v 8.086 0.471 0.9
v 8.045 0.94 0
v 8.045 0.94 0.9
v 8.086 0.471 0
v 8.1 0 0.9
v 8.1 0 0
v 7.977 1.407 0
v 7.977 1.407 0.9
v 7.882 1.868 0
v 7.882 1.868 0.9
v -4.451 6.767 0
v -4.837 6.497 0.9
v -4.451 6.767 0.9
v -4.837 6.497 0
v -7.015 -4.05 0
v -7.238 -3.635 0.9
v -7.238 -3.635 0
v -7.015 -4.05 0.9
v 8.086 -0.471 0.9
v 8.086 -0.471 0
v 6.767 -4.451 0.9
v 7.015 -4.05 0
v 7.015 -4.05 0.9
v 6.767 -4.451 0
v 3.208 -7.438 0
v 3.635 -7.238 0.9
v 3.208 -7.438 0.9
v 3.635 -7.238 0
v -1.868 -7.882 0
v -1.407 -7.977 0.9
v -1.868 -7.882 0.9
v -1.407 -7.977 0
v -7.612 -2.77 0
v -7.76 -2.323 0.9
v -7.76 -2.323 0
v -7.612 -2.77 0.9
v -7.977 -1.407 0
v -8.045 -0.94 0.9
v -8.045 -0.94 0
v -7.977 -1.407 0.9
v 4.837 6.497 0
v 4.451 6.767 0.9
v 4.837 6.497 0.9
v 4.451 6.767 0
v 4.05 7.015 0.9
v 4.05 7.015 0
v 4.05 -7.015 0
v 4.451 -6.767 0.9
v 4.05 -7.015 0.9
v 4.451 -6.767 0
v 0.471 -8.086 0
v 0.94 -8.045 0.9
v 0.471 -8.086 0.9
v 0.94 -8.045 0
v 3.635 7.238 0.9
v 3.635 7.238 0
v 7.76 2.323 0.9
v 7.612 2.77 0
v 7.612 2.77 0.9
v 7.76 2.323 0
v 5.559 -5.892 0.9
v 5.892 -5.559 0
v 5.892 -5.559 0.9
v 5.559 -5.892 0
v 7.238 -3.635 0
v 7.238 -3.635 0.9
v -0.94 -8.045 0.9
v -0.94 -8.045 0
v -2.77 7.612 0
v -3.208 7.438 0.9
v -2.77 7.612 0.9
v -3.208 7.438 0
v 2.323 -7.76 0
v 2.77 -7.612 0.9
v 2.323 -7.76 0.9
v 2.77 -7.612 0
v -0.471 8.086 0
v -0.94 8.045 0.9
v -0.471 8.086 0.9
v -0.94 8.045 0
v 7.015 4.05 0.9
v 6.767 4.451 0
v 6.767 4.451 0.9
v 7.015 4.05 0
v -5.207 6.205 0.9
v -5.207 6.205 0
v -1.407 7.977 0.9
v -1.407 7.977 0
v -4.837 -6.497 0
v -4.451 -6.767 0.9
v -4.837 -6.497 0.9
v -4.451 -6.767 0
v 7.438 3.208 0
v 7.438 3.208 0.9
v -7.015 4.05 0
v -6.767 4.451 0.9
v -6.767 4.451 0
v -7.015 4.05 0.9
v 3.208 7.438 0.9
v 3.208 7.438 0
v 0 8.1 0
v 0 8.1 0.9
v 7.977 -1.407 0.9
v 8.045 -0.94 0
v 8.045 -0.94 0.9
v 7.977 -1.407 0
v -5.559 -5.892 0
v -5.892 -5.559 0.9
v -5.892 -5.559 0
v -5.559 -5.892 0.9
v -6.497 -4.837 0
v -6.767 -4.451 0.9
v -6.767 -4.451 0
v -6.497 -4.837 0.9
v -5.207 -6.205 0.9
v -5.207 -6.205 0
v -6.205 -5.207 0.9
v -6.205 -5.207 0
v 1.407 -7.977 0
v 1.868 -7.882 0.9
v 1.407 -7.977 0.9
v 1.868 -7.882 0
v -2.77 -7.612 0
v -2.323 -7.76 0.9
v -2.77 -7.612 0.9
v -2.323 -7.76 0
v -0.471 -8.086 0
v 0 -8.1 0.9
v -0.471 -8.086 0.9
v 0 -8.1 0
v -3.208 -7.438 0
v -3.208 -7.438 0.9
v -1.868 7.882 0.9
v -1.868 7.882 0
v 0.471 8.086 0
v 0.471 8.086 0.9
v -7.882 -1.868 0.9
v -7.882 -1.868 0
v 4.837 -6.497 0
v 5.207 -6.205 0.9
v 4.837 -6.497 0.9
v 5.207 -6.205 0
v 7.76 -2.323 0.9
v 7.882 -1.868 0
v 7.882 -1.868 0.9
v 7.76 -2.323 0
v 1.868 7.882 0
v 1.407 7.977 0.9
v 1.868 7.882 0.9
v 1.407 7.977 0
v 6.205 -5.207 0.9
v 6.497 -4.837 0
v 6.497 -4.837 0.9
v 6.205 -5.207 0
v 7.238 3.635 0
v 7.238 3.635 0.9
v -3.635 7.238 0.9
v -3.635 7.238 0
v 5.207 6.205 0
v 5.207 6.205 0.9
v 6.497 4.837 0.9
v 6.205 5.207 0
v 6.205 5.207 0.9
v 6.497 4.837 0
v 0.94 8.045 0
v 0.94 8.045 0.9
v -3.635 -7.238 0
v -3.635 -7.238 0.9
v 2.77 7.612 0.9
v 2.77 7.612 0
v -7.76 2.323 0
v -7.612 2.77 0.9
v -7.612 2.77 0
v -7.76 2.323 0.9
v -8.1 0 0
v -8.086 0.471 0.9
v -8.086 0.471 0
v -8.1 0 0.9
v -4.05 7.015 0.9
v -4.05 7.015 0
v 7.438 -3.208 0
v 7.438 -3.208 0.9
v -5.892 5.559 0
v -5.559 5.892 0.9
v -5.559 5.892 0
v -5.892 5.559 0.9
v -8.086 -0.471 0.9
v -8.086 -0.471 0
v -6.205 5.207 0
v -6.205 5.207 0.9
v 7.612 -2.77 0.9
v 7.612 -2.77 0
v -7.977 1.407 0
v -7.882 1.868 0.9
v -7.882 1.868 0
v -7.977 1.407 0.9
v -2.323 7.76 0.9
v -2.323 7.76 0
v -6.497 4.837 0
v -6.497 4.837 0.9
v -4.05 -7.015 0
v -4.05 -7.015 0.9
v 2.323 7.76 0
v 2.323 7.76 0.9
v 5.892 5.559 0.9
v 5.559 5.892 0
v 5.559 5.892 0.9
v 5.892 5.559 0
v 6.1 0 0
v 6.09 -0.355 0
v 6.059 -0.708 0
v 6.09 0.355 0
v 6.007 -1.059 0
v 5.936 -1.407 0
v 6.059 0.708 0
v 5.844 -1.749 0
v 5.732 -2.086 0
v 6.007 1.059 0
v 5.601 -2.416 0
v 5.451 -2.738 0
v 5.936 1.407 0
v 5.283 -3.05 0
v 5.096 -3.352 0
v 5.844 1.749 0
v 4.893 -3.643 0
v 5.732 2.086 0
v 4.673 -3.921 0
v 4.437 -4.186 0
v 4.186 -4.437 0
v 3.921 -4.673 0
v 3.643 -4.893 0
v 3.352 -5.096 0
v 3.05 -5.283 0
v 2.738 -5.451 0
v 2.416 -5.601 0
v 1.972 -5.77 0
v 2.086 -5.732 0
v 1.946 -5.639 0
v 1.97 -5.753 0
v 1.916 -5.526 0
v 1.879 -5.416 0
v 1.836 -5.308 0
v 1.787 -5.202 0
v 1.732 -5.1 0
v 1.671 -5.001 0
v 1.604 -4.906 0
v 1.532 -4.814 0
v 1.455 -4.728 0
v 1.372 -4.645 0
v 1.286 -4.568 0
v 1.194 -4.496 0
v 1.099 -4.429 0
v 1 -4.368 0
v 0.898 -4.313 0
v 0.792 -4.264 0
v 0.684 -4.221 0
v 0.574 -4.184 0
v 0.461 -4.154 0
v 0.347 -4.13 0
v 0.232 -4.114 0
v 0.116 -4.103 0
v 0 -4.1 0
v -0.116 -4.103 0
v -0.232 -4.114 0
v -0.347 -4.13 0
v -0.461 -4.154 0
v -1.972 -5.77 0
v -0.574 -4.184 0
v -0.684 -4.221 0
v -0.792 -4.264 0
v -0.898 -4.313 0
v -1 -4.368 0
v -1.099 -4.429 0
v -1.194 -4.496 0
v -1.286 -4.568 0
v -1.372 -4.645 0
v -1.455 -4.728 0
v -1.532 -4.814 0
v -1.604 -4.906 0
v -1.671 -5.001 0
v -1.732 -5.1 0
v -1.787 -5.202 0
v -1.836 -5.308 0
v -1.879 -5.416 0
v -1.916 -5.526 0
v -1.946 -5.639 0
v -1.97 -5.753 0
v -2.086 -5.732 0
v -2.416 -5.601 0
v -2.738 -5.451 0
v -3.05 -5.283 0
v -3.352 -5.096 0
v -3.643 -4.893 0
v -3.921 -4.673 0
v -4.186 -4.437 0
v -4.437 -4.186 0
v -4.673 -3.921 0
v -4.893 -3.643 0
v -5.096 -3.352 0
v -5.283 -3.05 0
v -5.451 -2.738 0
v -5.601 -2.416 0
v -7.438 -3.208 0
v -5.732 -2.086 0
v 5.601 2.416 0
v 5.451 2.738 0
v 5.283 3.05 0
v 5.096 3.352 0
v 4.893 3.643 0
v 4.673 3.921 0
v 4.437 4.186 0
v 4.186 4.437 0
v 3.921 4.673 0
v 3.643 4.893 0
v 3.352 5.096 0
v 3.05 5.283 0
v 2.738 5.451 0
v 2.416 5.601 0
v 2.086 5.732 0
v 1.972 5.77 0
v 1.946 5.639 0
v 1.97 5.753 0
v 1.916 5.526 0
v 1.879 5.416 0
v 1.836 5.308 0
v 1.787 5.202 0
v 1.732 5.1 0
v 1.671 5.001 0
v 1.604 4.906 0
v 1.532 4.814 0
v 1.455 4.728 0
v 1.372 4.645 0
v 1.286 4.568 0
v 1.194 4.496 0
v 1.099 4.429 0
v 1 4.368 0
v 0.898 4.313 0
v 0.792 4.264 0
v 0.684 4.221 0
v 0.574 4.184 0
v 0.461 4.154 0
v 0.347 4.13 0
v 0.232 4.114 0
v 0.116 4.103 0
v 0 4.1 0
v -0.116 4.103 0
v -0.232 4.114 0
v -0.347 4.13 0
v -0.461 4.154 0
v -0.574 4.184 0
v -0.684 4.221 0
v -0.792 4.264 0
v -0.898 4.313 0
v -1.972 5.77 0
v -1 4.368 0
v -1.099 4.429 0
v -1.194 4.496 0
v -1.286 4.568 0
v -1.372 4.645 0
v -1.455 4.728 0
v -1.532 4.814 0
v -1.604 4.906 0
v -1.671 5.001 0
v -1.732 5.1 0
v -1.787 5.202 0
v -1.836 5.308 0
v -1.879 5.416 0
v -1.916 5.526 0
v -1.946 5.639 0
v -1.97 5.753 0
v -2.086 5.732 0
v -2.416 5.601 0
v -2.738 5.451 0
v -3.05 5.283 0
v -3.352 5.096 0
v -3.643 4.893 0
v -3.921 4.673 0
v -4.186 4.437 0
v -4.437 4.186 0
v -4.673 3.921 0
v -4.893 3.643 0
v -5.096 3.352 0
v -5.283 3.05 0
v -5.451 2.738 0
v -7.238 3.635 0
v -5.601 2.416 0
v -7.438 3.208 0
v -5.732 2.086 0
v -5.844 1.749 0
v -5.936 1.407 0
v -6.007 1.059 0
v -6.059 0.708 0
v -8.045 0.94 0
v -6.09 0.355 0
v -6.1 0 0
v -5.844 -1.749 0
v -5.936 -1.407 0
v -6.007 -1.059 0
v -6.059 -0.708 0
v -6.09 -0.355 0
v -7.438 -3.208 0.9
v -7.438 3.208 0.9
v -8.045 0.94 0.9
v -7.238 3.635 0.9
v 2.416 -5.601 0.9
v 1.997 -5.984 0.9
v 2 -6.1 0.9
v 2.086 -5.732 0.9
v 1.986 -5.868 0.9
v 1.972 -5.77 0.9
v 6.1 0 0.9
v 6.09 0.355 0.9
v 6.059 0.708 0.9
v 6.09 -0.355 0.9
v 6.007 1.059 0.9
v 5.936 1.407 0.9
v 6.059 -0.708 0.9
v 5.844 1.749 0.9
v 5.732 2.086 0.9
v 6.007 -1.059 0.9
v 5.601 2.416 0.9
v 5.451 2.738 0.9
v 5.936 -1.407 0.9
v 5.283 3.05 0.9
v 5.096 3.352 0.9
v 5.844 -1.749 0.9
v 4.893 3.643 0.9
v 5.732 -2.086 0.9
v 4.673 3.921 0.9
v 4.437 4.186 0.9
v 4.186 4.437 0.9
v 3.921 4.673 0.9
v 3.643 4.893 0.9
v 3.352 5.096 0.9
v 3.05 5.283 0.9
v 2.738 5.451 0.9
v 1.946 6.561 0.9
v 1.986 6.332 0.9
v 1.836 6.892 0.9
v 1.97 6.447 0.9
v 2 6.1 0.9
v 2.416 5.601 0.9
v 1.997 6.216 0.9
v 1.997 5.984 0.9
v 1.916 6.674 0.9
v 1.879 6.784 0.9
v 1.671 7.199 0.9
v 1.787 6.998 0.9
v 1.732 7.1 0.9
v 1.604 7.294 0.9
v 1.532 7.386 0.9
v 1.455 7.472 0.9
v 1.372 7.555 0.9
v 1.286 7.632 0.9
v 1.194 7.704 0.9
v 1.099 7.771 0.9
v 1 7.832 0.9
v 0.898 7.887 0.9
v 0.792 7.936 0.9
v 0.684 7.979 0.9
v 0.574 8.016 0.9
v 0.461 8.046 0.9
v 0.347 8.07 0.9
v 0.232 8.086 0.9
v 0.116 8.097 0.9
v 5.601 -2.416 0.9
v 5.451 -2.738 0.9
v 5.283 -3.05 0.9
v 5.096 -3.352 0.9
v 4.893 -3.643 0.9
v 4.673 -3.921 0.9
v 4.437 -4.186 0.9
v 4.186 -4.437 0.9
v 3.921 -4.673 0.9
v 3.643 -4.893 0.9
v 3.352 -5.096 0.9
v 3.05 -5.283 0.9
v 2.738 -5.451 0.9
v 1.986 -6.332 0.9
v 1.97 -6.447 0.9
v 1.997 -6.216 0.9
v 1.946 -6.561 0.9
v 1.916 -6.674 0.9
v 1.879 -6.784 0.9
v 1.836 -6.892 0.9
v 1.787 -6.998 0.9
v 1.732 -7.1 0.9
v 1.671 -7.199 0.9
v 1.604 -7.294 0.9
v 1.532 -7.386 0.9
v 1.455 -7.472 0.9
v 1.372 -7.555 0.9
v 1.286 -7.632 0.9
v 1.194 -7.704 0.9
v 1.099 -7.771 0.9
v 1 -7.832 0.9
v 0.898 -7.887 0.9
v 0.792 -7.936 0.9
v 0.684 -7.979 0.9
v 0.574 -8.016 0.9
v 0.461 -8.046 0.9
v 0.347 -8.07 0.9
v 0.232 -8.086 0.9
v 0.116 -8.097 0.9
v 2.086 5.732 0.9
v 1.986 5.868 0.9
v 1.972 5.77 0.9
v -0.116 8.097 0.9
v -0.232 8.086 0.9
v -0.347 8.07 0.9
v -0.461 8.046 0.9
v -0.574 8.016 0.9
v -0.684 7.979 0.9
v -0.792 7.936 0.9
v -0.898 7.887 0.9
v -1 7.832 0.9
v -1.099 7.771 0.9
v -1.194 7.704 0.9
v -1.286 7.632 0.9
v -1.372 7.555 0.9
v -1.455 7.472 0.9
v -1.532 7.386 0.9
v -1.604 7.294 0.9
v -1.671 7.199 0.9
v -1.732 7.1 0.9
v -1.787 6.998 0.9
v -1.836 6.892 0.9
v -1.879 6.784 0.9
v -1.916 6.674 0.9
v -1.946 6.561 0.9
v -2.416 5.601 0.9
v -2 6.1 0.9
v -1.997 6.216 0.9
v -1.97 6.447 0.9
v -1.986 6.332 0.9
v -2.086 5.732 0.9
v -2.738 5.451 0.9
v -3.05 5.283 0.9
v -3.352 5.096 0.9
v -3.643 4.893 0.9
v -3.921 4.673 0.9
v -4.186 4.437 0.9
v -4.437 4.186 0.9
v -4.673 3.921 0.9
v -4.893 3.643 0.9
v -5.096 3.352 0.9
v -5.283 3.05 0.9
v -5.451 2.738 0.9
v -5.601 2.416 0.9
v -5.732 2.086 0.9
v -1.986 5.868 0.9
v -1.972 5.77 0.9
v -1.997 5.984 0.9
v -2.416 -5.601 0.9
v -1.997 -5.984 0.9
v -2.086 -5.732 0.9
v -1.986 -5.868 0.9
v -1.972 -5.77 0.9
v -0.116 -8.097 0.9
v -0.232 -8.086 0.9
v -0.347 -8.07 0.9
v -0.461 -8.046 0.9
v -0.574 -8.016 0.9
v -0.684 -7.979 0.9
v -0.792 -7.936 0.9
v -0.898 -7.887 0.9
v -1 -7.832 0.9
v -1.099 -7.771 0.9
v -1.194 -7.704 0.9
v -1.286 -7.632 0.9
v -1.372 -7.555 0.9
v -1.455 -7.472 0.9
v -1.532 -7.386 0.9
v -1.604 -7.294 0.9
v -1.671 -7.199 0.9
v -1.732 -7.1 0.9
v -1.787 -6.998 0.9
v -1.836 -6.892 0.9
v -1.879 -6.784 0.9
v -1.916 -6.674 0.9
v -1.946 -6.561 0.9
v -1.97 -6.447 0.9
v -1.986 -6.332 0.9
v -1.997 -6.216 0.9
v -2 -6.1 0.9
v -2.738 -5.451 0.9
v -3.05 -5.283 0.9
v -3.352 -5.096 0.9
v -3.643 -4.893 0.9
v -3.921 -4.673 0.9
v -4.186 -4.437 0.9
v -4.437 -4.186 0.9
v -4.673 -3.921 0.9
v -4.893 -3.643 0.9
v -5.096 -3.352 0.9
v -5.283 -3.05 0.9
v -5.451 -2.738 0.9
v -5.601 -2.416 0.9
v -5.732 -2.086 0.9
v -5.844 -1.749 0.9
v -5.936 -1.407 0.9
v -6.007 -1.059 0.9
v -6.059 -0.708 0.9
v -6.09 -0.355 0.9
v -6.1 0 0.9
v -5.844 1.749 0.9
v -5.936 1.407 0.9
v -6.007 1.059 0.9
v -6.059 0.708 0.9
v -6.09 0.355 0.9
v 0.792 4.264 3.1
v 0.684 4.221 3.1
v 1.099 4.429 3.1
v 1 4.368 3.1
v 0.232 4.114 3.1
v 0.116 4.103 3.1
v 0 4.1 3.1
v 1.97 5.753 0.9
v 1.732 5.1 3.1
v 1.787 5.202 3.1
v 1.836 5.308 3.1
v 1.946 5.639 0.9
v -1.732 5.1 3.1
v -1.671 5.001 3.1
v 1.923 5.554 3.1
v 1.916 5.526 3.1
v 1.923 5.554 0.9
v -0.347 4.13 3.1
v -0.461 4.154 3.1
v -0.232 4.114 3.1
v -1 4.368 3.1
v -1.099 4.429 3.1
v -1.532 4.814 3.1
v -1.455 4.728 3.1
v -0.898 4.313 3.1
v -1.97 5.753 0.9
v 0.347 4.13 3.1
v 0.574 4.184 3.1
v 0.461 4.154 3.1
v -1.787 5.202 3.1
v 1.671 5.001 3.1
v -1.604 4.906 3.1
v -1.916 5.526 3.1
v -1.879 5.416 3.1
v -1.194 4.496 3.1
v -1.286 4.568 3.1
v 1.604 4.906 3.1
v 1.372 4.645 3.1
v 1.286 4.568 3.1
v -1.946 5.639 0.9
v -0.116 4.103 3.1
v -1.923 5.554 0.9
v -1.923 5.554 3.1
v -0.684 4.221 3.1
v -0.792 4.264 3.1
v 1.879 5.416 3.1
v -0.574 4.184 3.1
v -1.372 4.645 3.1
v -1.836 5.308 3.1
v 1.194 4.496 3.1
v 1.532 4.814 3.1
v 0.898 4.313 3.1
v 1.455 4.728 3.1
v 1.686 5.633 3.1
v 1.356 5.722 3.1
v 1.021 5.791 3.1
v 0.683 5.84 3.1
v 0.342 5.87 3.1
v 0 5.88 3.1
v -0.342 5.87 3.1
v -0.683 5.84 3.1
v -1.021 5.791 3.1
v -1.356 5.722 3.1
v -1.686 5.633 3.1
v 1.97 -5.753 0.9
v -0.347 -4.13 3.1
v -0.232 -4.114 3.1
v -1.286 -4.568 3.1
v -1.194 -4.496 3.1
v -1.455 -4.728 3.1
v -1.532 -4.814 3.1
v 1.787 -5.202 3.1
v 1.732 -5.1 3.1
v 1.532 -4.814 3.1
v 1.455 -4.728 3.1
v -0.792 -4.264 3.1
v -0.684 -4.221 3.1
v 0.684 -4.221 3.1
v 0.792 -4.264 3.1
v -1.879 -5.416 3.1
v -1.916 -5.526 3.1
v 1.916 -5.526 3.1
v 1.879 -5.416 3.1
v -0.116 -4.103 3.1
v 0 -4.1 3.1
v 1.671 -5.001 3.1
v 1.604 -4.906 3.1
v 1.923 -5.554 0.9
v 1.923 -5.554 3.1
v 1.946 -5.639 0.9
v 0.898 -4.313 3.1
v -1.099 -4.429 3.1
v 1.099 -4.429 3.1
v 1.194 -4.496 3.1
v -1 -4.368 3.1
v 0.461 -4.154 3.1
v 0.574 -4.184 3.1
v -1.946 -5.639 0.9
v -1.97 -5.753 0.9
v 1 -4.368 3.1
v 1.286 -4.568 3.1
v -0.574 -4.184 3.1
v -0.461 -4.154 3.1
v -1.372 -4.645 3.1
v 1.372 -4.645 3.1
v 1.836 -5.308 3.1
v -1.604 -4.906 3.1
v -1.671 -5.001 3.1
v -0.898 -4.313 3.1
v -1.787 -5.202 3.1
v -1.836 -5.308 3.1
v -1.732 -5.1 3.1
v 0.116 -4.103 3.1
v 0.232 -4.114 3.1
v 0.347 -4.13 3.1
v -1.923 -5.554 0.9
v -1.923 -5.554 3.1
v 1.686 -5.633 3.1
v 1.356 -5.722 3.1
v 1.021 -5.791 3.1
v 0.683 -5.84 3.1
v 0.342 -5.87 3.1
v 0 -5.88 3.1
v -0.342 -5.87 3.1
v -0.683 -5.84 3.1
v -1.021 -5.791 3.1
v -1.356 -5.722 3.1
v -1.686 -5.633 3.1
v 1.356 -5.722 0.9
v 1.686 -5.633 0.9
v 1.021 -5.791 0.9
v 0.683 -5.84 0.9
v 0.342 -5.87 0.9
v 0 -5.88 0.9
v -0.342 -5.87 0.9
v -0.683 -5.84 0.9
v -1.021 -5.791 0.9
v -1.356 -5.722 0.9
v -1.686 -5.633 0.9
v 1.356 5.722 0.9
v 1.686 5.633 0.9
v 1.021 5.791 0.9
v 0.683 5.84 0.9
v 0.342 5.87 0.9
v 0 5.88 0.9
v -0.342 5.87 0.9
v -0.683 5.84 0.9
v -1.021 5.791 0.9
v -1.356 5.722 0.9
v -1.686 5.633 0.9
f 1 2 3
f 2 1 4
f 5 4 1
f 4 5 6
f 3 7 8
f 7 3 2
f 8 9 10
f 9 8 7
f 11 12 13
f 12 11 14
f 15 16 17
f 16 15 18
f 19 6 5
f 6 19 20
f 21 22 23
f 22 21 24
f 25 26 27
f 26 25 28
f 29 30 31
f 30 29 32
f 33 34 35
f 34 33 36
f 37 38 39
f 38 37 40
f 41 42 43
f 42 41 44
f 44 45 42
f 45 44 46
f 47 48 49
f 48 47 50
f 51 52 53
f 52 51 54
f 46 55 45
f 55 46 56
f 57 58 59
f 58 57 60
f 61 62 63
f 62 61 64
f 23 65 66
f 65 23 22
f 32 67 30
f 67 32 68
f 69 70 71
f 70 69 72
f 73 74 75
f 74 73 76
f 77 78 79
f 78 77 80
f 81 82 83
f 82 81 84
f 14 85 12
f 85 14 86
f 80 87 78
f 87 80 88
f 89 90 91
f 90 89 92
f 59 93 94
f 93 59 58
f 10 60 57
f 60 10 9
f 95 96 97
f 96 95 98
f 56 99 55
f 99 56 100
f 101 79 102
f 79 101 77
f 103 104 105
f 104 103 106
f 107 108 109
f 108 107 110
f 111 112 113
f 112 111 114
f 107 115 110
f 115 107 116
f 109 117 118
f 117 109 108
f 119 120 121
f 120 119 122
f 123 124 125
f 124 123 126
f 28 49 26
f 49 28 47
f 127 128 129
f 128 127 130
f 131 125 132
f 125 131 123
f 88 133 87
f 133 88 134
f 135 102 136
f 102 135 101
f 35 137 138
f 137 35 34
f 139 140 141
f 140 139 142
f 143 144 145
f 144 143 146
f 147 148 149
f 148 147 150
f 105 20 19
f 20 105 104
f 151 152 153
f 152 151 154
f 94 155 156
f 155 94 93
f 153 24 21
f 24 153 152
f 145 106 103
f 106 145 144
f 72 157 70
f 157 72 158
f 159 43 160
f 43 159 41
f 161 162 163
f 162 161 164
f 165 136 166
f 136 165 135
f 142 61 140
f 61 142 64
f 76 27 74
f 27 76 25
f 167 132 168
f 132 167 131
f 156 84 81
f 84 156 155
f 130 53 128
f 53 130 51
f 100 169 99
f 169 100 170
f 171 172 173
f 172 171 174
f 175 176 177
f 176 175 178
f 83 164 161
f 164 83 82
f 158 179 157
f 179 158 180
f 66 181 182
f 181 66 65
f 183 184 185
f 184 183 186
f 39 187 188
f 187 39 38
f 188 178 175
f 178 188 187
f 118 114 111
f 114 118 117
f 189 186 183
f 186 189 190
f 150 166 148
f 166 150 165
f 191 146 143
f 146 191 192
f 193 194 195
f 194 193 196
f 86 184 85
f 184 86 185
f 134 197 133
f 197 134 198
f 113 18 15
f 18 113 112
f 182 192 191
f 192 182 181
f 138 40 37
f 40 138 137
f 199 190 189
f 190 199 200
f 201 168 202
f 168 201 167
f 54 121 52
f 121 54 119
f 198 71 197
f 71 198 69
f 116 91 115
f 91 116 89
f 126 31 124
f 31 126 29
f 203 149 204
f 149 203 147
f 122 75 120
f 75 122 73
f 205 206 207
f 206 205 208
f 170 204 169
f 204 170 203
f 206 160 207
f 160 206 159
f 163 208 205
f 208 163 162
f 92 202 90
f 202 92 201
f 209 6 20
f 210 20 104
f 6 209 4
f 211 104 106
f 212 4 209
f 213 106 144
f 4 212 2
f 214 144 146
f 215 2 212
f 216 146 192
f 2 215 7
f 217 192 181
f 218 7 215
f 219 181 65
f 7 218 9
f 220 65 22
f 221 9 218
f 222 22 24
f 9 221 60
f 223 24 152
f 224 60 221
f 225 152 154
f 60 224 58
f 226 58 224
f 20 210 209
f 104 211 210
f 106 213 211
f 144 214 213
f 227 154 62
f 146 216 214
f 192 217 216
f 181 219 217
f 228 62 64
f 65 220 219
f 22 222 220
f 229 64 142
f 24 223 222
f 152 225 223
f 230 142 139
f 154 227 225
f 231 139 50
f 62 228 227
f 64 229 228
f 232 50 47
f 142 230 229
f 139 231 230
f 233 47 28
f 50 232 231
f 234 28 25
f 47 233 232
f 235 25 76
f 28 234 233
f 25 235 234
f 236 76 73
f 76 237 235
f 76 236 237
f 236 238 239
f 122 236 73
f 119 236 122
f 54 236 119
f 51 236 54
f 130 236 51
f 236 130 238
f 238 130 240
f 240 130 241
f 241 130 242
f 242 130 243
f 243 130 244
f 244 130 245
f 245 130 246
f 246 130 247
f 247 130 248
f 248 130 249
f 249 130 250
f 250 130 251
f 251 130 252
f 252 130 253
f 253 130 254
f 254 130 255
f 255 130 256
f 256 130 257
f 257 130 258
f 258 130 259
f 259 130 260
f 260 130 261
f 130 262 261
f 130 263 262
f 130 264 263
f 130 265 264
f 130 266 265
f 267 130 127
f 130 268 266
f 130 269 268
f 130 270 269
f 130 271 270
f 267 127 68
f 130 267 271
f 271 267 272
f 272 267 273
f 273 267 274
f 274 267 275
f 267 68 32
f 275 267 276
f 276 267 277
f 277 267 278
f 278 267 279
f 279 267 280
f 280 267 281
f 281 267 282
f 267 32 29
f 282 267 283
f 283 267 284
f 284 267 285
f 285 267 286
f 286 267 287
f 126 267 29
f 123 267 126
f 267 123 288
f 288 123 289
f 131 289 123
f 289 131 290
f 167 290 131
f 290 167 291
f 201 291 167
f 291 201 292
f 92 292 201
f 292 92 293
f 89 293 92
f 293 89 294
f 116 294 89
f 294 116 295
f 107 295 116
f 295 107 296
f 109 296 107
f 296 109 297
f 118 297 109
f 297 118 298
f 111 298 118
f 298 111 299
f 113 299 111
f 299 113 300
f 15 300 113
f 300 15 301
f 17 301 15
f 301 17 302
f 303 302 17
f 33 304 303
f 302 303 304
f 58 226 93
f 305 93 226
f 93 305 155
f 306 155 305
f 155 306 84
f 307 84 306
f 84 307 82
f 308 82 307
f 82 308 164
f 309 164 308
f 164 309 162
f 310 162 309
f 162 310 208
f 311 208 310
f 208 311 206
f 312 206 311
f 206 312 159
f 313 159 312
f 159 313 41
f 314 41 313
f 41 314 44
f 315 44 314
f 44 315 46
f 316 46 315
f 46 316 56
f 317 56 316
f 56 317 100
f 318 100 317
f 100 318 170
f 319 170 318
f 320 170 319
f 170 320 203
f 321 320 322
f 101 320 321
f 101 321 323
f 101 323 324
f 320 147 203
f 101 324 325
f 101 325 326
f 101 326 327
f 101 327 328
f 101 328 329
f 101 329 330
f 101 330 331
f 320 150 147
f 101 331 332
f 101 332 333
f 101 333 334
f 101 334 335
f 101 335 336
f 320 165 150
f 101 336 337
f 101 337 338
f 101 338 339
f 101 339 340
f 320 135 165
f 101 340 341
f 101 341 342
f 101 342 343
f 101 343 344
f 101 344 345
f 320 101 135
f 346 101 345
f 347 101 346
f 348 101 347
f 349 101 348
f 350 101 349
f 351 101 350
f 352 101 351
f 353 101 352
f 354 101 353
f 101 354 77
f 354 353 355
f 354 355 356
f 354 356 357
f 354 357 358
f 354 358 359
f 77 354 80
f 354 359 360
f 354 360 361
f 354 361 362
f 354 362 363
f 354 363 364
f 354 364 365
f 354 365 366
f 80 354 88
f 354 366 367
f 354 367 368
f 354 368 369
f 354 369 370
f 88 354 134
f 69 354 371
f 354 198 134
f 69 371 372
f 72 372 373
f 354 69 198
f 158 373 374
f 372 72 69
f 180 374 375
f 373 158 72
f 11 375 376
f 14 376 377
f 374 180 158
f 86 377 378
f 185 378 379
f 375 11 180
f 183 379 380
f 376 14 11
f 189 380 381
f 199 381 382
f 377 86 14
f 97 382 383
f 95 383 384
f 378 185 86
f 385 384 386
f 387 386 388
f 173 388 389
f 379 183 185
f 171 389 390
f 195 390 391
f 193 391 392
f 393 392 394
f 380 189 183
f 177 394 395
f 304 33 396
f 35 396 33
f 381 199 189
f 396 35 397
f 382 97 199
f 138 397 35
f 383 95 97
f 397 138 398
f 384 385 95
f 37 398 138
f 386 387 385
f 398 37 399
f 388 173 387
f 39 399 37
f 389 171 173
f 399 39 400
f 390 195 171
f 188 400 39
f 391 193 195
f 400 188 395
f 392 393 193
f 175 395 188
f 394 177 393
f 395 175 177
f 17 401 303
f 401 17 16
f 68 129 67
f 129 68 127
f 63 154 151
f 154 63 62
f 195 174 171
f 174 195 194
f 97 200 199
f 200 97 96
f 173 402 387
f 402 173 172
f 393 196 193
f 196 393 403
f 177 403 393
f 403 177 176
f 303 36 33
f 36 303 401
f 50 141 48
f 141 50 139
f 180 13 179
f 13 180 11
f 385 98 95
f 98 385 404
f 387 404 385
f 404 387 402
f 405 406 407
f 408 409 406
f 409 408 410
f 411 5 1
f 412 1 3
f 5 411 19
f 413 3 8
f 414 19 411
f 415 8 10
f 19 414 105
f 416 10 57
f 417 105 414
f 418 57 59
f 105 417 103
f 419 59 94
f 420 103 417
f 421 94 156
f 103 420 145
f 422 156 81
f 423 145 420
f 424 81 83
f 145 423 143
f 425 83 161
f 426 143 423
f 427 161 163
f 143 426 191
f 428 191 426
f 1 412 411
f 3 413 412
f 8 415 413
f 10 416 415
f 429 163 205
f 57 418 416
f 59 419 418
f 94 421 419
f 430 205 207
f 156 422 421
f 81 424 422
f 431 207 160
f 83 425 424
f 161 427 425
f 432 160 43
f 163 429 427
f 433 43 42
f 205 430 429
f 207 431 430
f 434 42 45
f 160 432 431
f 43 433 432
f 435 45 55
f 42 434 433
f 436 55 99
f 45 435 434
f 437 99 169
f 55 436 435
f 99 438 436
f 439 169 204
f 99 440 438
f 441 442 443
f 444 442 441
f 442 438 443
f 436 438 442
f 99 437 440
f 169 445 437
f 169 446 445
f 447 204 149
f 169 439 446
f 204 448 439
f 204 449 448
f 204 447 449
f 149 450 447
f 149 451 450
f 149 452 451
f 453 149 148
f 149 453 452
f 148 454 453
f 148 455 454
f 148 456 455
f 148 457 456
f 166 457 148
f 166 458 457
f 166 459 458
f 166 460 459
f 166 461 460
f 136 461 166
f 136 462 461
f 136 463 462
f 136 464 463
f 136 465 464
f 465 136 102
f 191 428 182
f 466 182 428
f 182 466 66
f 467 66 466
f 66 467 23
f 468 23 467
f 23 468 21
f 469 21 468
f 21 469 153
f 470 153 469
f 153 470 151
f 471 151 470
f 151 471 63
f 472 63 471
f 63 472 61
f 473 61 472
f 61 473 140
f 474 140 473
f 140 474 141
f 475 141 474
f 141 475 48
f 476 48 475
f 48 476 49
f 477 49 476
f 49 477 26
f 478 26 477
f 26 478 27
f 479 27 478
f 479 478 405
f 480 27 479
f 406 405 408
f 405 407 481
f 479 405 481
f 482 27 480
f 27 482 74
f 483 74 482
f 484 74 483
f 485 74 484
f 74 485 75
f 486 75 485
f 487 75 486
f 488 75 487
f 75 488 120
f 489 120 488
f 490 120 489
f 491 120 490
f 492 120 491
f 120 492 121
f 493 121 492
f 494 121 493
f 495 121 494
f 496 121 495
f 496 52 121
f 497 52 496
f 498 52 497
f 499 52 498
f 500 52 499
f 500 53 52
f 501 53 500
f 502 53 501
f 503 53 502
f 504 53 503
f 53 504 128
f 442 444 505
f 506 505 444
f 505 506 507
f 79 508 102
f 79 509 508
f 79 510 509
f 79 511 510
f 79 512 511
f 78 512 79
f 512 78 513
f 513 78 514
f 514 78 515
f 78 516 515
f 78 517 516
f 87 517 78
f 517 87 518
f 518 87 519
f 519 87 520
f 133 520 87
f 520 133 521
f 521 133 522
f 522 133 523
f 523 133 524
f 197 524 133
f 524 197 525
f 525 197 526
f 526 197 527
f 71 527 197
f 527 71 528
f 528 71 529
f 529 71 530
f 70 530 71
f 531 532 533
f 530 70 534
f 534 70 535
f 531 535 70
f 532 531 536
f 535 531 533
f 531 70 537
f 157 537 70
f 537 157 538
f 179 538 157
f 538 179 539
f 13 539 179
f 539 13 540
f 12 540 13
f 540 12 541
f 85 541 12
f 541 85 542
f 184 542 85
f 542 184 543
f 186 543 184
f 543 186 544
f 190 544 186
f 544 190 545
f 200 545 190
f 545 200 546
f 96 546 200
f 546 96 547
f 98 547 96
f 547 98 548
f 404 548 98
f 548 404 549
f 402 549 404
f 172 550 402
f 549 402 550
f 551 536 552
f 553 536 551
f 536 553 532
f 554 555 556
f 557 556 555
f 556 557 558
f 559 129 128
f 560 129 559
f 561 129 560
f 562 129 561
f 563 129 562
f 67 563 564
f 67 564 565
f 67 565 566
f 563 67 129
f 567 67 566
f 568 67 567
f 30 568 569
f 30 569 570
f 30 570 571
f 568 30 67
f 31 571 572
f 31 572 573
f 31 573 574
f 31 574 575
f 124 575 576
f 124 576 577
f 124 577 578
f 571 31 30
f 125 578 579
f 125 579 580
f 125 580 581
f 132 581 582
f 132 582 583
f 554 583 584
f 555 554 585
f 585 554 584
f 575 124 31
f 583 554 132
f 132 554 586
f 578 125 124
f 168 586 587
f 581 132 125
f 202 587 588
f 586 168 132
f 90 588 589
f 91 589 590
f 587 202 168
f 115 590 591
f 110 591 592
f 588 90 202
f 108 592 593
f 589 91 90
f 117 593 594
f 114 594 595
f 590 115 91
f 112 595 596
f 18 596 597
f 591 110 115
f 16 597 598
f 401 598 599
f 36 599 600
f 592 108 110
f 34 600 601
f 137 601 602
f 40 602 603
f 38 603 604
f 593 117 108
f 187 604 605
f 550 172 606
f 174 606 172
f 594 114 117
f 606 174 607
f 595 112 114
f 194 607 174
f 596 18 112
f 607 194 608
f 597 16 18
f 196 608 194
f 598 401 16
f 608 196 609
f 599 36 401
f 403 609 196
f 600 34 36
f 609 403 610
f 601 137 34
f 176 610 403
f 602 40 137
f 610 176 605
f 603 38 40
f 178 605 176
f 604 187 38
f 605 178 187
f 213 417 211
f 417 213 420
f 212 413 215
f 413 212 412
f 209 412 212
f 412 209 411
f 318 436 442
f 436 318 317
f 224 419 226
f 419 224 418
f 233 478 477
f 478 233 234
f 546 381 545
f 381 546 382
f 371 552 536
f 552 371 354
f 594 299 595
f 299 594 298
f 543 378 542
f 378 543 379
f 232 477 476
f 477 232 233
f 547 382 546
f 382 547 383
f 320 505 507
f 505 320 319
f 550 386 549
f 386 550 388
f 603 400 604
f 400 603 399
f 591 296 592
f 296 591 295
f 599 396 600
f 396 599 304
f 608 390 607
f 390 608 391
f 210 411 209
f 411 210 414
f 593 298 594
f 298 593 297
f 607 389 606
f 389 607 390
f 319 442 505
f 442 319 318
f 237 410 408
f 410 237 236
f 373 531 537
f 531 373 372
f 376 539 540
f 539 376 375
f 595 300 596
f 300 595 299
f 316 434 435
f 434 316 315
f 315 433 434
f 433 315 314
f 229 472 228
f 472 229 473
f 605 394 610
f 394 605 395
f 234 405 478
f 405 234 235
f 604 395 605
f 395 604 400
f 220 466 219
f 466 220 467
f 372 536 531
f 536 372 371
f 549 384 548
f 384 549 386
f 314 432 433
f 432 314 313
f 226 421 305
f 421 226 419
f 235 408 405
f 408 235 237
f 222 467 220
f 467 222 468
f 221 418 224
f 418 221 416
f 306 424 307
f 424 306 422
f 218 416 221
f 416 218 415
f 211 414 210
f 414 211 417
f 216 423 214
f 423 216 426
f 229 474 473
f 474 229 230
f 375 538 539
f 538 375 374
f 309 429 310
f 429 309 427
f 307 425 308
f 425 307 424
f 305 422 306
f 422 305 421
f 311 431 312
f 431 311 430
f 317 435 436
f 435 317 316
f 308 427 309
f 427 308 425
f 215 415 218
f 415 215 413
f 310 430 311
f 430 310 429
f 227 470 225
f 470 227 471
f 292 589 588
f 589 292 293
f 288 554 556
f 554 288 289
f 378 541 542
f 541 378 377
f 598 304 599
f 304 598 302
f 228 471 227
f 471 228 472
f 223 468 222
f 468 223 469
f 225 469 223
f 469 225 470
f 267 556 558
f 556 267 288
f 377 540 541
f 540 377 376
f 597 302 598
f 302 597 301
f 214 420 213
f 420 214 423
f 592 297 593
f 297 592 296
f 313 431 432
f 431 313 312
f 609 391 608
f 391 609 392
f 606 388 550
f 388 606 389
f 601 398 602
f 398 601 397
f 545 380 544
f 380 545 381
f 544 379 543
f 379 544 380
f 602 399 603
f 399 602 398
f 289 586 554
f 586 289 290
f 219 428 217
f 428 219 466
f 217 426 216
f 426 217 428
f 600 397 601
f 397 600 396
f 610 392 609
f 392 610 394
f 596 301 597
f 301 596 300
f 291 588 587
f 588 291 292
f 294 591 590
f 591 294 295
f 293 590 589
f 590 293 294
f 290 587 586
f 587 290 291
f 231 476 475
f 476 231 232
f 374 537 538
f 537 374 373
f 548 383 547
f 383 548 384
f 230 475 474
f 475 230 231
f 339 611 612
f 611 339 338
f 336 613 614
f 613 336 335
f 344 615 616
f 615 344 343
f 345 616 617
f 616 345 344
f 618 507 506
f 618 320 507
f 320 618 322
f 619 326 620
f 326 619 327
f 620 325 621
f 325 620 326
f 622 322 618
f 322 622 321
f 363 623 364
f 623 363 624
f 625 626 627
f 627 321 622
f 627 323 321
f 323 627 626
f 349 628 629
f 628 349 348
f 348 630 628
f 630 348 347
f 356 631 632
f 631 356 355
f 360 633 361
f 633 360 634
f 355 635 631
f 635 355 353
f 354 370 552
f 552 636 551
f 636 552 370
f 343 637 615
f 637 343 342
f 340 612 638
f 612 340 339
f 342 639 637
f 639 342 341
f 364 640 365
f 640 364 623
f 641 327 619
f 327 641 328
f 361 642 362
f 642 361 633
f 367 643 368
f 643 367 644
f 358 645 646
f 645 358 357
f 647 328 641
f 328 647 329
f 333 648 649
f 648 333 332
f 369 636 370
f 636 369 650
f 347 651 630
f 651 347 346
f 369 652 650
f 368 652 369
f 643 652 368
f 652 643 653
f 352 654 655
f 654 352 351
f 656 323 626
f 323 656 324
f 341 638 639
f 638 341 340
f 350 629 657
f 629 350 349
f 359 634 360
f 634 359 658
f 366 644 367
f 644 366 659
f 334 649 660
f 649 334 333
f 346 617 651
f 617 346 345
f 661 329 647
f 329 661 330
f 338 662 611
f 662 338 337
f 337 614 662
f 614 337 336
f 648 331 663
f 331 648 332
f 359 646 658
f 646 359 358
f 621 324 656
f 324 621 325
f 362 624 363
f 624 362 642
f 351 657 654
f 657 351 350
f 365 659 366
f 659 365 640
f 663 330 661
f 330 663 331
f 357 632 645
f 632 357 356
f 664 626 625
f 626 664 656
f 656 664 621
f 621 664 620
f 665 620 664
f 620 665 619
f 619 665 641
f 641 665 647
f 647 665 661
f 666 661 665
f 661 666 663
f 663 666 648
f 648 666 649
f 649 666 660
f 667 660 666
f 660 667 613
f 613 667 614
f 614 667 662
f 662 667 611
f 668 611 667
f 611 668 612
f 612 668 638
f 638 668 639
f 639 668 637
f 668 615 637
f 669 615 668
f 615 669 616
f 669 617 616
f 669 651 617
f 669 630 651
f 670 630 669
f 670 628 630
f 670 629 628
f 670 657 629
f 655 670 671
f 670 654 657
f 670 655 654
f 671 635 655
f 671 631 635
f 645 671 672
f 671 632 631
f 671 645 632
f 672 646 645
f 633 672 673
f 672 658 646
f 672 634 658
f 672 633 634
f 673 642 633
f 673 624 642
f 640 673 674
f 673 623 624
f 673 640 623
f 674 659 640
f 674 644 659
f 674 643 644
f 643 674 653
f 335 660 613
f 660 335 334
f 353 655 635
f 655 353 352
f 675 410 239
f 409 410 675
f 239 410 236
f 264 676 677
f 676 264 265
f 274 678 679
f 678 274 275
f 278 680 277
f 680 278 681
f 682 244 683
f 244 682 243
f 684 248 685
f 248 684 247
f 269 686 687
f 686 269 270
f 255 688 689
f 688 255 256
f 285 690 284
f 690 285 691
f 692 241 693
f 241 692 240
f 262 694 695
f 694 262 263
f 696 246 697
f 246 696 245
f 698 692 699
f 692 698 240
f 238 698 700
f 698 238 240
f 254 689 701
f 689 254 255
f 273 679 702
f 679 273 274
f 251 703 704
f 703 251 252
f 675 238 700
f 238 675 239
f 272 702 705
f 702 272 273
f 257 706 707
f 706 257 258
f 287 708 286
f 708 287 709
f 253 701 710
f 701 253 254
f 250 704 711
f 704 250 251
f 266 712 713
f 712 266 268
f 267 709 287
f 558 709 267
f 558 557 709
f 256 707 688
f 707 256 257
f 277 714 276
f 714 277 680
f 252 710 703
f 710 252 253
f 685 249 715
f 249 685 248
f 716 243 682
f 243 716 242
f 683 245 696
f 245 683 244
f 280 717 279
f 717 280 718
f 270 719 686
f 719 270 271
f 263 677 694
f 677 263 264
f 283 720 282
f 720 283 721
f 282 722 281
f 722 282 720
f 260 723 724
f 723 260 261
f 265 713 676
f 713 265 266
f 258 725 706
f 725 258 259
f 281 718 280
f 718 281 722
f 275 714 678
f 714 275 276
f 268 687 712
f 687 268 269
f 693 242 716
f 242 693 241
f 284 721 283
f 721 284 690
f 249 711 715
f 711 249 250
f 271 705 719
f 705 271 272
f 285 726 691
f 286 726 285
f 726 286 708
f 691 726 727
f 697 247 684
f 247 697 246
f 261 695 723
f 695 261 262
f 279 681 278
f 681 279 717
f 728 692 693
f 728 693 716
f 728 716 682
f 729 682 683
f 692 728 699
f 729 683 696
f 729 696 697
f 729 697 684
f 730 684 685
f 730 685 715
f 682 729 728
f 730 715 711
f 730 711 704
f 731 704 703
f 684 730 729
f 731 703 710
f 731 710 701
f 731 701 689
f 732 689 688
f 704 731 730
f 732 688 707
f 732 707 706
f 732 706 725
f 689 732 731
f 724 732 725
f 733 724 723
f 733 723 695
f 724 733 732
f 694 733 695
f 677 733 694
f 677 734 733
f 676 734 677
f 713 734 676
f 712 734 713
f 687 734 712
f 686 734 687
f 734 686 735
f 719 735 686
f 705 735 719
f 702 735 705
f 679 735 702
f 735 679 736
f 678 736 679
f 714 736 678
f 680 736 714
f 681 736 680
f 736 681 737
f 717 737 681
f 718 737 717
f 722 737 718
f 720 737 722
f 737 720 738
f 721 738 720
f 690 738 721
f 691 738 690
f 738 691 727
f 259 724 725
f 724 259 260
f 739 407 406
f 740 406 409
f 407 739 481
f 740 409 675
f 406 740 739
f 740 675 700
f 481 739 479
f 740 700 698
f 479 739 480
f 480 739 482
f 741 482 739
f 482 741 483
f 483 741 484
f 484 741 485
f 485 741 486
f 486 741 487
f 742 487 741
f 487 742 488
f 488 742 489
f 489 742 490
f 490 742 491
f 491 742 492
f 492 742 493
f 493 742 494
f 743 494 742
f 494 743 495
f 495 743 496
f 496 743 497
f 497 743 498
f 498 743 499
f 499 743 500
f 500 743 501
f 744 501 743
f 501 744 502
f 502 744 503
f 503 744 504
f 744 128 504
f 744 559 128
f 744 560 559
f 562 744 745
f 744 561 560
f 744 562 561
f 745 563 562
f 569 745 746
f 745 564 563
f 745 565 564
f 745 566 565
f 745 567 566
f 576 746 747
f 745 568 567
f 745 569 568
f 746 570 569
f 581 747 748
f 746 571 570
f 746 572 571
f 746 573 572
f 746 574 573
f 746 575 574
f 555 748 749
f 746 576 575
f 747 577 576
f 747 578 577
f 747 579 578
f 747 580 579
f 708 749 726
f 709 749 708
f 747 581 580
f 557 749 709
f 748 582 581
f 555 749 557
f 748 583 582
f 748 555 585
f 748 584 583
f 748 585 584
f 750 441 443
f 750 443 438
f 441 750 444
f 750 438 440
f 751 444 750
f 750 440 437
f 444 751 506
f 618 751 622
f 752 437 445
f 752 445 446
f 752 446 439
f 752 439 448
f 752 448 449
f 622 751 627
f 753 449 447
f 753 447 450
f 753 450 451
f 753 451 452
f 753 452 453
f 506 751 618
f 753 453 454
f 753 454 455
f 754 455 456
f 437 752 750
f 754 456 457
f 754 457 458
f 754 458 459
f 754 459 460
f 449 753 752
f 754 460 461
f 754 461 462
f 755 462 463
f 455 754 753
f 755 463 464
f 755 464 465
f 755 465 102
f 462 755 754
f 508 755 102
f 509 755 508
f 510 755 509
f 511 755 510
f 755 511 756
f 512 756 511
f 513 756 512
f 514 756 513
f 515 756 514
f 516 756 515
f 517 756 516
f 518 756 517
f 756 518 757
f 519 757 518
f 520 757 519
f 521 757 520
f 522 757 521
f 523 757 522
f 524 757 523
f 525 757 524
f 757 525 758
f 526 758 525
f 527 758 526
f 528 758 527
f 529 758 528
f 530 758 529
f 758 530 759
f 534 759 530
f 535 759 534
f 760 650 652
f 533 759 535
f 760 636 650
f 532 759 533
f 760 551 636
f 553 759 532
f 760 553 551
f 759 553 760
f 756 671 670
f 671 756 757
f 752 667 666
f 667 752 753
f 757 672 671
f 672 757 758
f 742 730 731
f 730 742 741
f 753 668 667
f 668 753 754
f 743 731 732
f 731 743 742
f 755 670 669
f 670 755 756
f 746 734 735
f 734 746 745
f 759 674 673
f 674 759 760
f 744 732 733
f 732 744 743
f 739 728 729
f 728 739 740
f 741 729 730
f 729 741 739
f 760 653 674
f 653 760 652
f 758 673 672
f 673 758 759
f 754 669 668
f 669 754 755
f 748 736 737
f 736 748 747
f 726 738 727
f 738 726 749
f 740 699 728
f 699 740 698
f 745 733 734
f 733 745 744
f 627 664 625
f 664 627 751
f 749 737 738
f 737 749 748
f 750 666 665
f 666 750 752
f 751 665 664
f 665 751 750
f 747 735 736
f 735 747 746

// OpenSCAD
//  Characters    Behavior
//     //            ignore, comment
//     $fa           minimum angle
//     *             disable
//     !             show only
//     #             highlight / debug
//     %             transparent / background
// http://www.openscad.org/cheatsheet/index.html

use <MCAD/regular_shapes.scad>

// Globals

convexity = 4;
number_of_fragments = 0.30 * 360;
eps = 0.001;

$fn = number_of_fragments;

nozzle_line_width = 0.4;

inner_diameter = 12.20;
outer_diameter = 16.20;
washer_height =   0.90;
flange_height =   2.20;

post_diameter = 4.00;


// Modules

module washer(outer_diameter, inner_diameter, washer_height)
{
    difference()
    {
        color("red")
        union()
        {
            cylinder(d=outer_diameter, h=washer_height);
        }

        color("blue")
        union()
        {
            scale([1, 1, 1.1])
            translate([0, 0, -eps])
            cylinder(d=inner_diameter, h=washer_height);
        }
    }
}


// Model

difference()
{
    union()
    {
        washer(outer_diameter, inner_diameter, washer_height);

        color("purple")
        {
            translate([0, inner_diameter/2, 0])
            cylinder(d=post_diameter, h=washer_height+flange_height);

            translate([0, -inner_diameter/2, 0])
            cylinder(d=post_diameter, h=washer_height+flange_height);
        }
    }

    translate([0, 0, washer_height])
    scale([1, 1, 1.1])
    washer(2*outer_diameter, inner_diameter-0.44, flange_height);

    *translate([0, 0, -eps])
    scale([1, 1, 1.1])
    washer(2*outer_diameter, outer_diameter, washer_height);
}
